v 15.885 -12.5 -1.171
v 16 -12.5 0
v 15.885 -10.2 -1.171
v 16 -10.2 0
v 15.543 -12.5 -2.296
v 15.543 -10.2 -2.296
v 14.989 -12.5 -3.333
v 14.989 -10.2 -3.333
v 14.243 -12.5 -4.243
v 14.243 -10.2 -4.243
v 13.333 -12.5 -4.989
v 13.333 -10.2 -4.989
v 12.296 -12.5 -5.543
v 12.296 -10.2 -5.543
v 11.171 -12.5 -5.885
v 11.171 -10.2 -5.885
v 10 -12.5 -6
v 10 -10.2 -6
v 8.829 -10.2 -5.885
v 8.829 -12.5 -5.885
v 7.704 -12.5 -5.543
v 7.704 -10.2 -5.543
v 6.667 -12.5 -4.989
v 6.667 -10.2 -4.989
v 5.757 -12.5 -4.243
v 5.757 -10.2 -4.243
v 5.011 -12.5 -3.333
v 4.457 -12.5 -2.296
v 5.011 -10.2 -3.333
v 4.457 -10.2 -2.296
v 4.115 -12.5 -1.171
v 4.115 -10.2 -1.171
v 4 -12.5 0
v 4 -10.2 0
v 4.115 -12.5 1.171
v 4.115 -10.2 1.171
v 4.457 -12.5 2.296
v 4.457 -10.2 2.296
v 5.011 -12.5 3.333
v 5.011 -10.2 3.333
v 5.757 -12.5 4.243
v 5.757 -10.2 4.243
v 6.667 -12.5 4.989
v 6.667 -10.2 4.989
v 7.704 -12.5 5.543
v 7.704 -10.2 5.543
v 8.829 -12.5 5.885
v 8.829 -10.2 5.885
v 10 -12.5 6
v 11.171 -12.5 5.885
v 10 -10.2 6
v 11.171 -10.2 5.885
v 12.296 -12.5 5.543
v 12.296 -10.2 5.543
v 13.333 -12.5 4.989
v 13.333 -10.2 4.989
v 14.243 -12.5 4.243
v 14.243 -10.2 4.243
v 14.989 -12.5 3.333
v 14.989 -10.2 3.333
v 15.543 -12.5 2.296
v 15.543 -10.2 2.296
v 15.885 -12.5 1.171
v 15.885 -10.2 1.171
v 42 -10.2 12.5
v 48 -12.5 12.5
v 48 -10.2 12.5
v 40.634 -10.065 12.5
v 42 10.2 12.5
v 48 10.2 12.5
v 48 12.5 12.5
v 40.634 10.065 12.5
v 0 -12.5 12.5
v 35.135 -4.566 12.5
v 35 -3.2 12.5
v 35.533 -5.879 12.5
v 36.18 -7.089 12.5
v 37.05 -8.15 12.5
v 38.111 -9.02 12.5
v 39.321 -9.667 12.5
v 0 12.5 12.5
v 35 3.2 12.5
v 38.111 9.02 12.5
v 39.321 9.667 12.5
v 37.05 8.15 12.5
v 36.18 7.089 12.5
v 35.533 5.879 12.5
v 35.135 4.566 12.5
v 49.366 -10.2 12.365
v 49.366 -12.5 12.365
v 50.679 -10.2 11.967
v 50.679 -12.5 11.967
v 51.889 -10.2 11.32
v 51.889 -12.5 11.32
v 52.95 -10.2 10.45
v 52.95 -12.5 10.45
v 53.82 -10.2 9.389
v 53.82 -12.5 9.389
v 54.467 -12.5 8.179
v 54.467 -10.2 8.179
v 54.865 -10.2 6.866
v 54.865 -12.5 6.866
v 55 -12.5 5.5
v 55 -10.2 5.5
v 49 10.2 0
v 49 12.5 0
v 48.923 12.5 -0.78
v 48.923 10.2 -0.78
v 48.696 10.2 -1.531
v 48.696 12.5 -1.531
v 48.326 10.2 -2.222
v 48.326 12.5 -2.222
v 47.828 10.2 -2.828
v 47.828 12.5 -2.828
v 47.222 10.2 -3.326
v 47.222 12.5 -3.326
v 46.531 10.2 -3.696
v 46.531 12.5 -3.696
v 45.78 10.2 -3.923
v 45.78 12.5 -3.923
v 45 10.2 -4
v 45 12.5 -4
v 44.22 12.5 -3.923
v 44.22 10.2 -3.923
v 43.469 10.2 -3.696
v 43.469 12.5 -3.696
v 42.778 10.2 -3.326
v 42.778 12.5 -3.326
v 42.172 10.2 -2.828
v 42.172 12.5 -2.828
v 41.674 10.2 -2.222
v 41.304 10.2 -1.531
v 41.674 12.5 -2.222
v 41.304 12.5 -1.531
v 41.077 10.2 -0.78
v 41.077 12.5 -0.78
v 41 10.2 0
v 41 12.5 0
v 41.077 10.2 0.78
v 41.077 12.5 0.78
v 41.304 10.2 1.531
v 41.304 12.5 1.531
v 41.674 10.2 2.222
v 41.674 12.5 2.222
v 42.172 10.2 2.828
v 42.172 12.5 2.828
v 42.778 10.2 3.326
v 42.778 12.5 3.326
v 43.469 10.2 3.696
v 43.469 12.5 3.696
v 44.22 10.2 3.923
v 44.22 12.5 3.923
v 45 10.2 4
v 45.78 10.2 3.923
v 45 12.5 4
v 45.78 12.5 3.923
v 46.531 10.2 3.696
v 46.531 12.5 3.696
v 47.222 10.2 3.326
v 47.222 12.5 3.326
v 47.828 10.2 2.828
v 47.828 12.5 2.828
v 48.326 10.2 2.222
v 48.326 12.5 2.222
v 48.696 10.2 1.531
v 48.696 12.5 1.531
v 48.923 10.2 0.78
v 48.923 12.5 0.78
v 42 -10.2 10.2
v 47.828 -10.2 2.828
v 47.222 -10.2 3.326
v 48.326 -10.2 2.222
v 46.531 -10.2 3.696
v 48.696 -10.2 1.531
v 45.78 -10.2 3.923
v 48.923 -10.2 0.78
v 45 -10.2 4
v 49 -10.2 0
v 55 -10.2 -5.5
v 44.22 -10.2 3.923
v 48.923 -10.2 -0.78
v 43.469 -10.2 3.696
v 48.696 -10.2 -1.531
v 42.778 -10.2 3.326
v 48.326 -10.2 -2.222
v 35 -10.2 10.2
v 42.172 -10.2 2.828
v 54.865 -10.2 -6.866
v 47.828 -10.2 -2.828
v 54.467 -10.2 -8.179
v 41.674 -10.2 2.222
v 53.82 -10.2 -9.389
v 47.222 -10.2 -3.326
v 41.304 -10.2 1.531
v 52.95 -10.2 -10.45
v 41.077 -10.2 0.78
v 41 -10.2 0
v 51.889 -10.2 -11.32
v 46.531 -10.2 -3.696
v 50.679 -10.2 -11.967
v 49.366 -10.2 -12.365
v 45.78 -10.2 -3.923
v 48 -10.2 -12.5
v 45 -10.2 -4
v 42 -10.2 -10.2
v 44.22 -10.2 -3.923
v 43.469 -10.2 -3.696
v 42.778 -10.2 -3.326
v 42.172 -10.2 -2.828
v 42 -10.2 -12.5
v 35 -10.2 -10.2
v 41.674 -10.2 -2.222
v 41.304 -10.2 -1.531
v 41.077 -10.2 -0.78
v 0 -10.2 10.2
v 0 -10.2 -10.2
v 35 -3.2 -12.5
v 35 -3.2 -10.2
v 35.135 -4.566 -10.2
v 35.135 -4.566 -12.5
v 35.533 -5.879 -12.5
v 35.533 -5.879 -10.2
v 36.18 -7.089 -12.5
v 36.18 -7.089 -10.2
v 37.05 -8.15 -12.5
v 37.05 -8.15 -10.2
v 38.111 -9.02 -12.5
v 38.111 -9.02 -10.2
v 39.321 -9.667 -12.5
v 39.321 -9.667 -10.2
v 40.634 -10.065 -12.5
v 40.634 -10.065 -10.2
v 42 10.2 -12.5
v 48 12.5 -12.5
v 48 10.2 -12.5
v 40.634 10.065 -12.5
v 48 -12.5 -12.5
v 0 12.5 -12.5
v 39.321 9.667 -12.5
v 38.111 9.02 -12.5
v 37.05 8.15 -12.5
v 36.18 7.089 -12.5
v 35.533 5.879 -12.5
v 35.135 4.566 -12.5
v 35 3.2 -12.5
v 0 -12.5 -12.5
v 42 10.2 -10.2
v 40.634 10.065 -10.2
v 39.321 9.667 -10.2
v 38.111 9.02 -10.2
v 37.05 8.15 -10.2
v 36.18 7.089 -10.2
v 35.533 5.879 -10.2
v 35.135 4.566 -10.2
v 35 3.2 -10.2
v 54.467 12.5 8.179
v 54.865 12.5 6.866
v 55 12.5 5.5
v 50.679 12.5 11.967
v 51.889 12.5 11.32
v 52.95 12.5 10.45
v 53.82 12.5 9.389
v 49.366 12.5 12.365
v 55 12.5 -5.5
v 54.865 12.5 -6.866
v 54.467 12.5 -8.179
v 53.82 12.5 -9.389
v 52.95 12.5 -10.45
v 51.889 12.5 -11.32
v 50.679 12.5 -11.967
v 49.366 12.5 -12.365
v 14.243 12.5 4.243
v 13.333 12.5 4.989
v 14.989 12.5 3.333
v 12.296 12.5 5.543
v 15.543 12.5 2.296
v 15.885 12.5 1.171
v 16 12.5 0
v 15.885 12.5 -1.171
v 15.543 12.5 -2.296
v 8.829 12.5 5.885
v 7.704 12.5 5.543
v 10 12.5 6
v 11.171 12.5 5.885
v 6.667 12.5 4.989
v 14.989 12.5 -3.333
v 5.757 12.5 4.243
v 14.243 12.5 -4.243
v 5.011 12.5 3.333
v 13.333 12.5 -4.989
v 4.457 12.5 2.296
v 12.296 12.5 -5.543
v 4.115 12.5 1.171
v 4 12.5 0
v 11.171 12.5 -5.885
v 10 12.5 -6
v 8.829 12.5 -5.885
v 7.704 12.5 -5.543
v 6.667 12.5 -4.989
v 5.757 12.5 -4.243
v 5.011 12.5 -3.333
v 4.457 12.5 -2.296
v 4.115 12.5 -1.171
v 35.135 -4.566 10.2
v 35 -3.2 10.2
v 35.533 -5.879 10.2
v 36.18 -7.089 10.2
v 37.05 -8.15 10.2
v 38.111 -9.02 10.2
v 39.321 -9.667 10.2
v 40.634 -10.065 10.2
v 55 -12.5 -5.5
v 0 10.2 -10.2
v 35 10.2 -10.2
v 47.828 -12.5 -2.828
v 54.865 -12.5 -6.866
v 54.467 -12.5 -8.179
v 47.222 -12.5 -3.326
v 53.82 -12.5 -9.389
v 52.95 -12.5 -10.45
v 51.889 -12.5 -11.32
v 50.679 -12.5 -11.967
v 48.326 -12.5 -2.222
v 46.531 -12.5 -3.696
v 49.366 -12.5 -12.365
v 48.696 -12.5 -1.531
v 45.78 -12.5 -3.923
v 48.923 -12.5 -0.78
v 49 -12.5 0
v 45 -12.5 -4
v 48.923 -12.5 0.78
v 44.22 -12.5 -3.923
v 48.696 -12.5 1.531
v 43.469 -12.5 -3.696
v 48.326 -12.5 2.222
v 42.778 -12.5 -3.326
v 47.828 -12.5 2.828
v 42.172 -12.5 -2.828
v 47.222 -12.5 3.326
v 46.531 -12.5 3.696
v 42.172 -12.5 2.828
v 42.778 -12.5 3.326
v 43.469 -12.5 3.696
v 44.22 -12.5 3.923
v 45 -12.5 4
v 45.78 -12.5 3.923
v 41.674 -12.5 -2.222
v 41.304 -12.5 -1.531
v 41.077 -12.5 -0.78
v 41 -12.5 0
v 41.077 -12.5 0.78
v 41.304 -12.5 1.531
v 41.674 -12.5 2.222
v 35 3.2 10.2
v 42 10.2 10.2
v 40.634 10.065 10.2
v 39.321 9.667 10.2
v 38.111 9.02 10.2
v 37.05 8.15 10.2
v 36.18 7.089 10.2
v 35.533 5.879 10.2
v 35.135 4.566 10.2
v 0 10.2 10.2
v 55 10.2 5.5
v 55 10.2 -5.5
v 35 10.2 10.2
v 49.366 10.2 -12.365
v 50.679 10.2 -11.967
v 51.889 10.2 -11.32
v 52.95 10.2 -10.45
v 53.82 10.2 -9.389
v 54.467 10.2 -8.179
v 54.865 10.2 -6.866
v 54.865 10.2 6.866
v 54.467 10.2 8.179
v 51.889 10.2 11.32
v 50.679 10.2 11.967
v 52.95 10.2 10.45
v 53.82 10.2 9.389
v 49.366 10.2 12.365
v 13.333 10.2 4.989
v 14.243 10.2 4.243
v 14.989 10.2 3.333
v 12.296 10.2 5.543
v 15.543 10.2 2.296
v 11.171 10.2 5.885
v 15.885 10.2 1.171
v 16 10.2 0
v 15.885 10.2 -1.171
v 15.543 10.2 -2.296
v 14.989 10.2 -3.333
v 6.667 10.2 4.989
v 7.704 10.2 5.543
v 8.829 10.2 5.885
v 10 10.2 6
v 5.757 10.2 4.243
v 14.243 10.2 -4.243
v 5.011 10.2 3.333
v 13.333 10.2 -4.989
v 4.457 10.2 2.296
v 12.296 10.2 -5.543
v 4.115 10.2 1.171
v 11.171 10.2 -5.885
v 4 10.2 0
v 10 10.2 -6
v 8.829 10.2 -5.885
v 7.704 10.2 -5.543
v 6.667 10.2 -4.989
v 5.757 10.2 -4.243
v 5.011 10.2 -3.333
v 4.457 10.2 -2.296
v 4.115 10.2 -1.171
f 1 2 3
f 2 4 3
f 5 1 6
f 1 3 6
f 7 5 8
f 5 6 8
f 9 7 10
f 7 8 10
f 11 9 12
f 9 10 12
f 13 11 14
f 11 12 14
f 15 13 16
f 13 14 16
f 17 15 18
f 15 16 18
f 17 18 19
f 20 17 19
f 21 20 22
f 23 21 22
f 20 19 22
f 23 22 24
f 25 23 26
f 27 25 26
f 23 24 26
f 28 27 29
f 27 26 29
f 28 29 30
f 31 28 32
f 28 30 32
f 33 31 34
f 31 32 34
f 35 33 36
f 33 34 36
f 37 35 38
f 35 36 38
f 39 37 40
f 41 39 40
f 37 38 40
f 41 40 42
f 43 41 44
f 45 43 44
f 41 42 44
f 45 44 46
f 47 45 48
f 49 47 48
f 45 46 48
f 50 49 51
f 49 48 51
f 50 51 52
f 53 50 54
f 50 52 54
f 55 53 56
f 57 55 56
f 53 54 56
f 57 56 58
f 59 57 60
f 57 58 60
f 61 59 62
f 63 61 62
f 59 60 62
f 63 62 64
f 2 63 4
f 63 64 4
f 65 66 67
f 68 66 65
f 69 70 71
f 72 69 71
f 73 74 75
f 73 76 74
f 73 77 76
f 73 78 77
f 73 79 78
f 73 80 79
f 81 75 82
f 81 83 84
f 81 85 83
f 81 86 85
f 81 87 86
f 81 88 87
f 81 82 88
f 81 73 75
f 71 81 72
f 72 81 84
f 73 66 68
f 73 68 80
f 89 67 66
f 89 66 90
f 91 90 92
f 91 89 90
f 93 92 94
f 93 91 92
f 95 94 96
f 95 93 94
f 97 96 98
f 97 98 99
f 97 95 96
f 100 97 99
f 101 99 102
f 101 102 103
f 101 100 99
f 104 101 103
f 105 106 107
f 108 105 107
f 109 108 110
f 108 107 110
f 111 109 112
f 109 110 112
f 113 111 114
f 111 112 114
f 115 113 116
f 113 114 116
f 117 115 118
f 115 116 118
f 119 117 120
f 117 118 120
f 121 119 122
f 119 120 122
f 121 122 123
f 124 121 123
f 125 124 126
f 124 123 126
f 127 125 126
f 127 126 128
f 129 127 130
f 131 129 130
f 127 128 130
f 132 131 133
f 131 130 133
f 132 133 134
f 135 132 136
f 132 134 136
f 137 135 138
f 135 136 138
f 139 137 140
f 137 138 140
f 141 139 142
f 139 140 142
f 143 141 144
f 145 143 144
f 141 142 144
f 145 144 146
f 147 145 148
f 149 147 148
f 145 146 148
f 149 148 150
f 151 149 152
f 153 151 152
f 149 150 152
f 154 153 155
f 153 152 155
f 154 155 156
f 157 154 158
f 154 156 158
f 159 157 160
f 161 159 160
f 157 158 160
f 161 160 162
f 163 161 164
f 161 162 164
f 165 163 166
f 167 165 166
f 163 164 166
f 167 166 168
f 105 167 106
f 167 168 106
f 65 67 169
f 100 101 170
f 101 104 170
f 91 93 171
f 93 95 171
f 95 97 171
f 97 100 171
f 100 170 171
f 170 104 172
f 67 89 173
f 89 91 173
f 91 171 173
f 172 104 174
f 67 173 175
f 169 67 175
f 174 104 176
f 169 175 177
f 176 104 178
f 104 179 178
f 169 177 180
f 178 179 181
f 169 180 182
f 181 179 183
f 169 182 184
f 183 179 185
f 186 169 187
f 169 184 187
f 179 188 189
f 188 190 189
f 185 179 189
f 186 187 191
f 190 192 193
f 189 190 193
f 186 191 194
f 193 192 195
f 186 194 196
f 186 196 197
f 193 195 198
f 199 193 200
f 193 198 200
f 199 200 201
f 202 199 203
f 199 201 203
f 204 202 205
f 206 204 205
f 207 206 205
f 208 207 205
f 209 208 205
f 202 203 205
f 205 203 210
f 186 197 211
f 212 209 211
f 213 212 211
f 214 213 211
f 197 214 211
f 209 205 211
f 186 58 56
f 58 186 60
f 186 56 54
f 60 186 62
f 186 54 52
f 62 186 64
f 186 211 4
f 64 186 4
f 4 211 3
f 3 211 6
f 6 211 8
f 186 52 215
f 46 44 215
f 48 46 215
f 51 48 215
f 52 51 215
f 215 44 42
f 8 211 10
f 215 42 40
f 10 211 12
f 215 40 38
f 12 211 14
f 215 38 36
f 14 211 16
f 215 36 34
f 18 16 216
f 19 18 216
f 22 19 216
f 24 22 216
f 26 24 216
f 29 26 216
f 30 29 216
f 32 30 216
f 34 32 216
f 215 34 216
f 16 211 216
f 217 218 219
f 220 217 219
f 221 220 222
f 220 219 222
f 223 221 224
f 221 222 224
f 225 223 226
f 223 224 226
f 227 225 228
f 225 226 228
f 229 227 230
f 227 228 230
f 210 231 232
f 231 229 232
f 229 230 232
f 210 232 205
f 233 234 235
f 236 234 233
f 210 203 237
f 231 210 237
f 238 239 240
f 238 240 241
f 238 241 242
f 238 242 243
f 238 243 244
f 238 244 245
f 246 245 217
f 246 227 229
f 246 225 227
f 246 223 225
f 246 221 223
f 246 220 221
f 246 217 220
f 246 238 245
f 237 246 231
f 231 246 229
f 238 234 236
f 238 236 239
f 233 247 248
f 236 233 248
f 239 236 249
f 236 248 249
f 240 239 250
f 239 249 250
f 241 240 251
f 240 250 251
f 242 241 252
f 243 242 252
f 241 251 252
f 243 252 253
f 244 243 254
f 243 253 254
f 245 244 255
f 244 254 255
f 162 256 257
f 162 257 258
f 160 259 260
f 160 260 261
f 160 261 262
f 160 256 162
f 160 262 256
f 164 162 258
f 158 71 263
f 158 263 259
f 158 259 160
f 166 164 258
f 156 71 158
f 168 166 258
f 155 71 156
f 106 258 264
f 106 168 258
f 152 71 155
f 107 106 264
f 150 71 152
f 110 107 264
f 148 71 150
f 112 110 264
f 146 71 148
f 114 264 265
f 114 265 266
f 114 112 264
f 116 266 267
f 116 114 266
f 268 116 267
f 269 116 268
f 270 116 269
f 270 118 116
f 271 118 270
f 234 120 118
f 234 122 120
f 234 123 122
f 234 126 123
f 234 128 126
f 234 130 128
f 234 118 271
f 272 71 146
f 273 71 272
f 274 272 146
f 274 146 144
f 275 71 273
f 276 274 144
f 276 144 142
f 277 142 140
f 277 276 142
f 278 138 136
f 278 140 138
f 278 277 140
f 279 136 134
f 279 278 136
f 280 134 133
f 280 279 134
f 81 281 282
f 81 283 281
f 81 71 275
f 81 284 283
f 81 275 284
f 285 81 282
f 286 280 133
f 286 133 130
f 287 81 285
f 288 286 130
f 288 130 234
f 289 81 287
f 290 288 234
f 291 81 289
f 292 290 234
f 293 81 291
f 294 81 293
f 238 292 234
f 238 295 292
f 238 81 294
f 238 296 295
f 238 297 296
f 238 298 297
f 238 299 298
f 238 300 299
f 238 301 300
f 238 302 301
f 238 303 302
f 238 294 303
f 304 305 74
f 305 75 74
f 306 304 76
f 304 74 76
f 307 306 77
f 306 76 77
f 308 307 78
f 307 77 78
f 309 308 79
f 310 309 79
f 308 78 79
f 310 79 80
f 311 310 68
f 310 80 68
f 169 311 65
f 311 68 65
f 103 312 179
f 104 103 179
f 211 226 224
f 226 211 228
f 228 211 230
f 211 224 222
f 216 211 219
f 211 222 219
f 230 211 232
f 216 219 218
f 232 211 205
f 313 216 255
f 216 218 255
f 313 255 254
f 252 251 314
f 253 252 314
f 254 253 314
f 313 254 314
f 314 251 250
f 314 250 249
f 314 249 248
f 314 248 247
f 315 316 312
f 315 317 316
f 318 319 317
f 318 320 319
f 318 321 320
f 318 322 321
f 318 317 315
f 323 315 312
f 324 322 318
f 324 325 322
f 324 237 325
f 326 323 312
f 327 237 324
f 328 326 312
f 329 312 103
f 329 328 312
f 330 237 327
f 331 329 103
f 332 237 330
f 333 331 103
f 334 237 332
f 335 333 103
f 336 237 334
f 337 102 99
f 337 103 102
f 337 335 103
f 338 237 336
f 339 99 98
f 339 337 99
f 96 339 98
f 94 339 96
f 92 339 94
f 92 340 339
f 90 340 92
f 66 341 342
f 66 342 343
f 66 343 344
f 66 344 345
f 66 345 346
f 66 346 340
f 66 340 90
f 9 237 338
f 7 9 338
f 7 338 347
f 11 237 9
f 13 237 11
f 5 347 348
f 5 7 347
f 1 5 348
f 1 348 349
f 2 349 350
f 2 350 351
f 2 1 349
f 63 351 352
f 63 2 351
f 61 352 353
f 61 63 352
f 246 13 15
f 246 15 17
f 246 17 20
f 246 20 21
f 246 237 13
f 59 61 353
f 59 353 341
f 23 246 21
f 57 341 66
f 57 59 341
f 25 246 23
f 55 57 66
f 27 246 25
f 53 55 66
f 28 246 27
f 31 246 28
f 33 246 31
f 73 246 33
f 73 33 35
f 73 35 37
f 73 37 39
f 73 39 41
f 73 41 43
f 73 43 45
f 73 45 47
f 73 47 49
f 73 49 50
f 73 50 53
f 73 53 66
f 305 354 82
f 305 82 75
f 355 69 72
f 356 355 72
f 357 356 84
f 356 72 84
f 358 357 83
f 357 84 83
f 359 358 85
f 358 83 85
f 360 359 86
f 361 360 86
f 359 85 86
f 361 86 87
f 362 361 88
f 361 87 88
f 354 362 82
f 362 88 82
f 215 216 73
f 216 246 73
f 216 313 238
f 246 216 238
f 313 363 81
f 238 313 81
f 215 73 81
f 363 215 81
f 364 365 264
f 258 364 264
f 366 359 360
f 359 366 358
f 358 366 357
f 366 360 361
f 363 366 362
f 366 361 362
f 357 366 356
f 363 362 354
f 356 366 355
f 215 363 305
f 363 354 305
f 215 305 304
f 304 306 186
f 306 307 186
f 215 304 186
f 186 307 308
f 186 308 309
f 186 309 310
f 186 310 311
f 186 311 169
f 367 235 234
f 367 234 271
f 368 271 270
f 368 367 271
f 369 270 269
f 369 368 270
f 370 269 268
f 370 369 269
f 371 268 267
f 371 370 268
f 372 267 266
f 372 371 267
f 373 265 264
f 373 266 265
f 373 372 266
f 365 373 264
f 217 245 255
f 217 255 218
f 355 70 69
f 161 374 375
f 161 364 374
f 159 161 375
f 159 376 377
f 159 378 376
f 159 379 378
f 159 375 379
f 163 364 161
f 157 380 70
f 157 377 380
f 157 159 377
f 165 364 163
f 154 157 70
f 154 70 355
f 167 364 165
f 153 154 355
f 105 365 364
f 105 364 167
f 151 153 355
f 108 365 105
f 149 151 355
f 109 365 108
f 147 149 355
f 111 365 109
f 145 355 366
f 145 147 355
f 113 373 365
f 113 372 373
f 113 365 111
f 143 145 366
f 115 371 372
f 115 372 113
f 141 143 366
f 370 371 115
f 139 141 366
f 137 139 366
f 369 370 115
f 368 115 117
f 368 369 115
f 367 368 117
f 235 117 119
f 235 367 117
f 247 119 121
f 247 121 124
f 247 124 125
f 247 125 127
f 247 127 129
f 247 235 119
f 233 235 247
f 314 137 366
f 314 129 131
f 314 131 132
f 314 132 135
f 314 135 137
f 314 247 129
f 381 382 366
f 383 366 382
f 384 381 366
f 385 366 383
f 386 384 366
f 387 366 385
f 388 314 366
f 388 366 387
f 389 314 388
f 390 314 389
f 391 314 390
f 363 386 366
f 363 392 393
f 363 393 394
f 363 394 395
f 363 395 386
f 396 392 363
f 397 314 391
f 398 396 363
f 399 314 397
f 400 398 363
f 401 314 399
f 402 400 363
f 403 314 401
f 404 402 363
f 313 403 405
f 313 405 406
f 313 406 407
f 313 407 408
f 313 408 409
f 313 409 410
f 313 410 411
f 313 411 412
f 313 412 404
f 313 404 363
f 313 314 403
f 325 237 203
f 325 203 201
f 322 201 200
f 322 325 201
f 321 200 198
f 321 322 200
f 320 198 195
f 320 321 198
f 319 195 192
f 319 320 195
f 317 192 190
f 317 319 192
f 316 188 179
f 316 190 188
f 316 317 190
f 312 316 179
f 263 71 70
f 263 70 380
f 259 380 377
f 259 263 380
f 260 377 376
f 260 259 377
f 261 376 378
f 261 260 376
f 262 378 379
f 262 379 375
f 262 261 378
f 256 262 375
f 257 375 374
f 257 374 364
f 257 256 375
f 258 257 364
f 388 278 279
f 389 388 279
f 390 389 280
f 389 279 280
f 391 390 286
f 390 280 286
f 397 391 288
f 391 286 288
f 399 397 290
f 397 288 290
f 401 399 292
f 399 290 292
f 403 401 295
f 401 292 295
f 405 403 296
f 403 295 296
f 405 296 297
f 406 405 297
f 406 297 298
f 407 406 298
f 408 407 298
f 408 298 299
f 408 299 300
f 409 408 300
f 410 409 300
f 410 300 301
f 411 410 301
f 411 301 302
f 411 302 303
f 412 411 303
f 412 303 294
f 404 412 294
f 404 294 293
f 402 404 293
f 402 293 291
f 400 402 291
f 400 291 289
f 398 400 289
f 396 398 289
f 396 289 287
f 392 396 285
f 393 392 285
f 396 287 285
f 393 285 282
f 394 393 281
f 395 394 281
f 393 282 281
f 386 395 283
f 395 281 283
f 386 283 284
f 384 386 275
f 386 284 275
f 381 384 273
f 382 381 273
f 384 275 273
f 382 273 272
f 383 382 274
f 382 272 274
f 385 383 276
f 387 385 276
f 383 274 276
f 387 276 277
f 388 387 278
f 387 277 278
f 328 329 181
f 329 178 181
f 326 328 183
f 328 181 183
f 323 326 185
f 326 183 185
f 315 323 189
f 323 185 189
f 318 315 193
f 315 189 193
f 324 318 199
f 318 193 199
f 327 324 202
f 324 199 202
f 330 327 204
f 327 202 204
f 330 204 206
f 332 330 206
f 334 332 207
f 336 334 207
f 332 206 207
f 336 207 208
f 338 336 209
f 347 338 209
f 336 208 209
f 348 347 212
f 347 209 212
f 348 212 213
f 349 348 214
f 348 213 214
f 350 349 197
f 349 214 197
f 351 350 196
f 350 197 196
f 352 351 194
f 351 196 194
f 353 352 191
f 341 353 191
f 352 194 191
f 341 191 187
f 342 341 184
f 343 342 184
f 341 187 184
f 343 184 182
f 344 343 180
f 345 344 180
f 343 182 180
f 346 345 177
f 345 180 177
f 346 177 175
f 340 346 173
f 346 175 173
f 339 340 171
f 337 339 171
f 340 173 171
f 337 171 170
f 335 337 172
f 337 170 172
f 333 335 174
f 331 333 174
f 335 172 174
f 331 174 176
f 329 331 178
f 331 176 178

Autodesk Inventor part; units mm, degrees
ref_plane "YZ Plane" through (0, 0, 0) normal (1, 0, 0) x (0, 1, 0)
ref_plane "XZ Plane" through (0, 0, 0) normal (0, 1, 0) x (-1, 0, 0)
ref_plane "XY Plane" through (0, 0, 0) normal (0, 0, 1) x (1, 0, 0)
sketch "スケッチ1" plane through (0, 0, 0) normal (1, 0, 0) x (0, 1, 0)
  line L0 (-12.5, 12.5) -> (12.5, 12.5)
  line L1 (12.5, 12.5) -> (12.5, -12.5)
  line L2 (12.5, -12.5) -> (-12.5, -12.5)
  line L3 (-12.5, -12.5) -> (-12.5, 12.5)
  line L4 (-12.5, 12.5) -> (12.5, -12.5) construction
  line L5 (12.5, 12.5) -> (-12.5, -12.5) construction
  point P0 (0, 0)
  dimension "d0" = 25
  dimension "d1" = 25
extrude "押し出し1" add sketch "スケッチ1" along normal blind 55
sketch "スケッチ2" plane through (0, 12.5, 12.5) normal (0, 1, 0) x (1, 0, 0)
  circle A0 centre (10, 12.5) radius 6
  line L0 (0, 0) -> (0, 25) projected
  line L1 (0, 0) -> (55, 0) projected
  point P0 (0, 12.5)
  dimension "d4" = 12
  dimension "d5" = 10
  dimension "d6" = 12.5
extrude "押し出し2" cut sketch "スケッチ2" against normal through all
sketch "スケッチ3" plane through (0, 12.5, 12.5) normal (0, 1, 0) x (1, 0, 0)
  circle A0 centre (45, 12.5) radius 4
  line L0 (55, 25) -> (55, 0) projected
  line L1 (0, 25) -> (55, 25) projected
  point P0 (0, 12.5)
  dimension "d9" = 10
  dimension "d10" = 8
  dimension "d11" = 12.5
extrude "押し出し3" cut sketch "スケッチ3" against normal through all
sketch "スケッチ4" plane through (55, 0, 0) normal (1, 0, 0) x (0, 0, -1)
  line L0 (-10.2, -10.2) -> (10.2, -10.2)
  line L1 (10.2, -10.2) -> (10.2, 10.2)
  line L2 (10.2, 10.2) -> (-10.2, 10.2)
  line L3 (-10.2, 10.2) -> (-10.2, -10.2)
  line L4 (-10.2, -10.2) -> (10.2, 10.2) construction
  line L5 (10.2, -10.2) -> (-10.2, 10.2) construction
  line L6 (-12.5, 12.5) -> (-12.5, -12.5) projected
  line L7 (12.5, 12.5) -> (-12.5, 12.5) projected
  point P0 (0, 0)
  dimension "d14" = 2.3
  dimension "d15" = 2.3
extrude "押し出し4" cut sketch "スケッチ4" against normal through all
sketch "スケッチ5" plane through (0, -12.5, -12.5) normal (0, 0, -1) x (-1, 0, 0)
  line L0 (-55, 2.3) -> (-55, 22.7) projected
  line L1 (-55, 2.3) -> (0, 2.3) projected
  line L2 (-55, 22.7) -> (-35, 22.7)
  line L3 (-35, 22.7) -> (-35, 2.3)
  line L4 (-35, 2.3) -> (-55, 2.3)
  line L5 (-55, 2.3) -> (-55, 22.7)
  point P0 (0, 12.5)
  dimension "d18" = 20
extrude "押し出し5" cut sketch "スケッチ5" against normal through all
fillet "フィレット1" radius 7 8 edges at (55, 11.35, -12.5) (55, -11.35, -12.5) (55, -11.35, 12.5) (55, 11.35, 12.5) (35, -10.2, -11.35) (35, -10.2, 11.35) (35, 10.2, -11.35) (35, 10.2, 11.35)
equation "\"d1\" = d0"
properties part number "bracket FU RL" material "鉄、可鍛鉄"
